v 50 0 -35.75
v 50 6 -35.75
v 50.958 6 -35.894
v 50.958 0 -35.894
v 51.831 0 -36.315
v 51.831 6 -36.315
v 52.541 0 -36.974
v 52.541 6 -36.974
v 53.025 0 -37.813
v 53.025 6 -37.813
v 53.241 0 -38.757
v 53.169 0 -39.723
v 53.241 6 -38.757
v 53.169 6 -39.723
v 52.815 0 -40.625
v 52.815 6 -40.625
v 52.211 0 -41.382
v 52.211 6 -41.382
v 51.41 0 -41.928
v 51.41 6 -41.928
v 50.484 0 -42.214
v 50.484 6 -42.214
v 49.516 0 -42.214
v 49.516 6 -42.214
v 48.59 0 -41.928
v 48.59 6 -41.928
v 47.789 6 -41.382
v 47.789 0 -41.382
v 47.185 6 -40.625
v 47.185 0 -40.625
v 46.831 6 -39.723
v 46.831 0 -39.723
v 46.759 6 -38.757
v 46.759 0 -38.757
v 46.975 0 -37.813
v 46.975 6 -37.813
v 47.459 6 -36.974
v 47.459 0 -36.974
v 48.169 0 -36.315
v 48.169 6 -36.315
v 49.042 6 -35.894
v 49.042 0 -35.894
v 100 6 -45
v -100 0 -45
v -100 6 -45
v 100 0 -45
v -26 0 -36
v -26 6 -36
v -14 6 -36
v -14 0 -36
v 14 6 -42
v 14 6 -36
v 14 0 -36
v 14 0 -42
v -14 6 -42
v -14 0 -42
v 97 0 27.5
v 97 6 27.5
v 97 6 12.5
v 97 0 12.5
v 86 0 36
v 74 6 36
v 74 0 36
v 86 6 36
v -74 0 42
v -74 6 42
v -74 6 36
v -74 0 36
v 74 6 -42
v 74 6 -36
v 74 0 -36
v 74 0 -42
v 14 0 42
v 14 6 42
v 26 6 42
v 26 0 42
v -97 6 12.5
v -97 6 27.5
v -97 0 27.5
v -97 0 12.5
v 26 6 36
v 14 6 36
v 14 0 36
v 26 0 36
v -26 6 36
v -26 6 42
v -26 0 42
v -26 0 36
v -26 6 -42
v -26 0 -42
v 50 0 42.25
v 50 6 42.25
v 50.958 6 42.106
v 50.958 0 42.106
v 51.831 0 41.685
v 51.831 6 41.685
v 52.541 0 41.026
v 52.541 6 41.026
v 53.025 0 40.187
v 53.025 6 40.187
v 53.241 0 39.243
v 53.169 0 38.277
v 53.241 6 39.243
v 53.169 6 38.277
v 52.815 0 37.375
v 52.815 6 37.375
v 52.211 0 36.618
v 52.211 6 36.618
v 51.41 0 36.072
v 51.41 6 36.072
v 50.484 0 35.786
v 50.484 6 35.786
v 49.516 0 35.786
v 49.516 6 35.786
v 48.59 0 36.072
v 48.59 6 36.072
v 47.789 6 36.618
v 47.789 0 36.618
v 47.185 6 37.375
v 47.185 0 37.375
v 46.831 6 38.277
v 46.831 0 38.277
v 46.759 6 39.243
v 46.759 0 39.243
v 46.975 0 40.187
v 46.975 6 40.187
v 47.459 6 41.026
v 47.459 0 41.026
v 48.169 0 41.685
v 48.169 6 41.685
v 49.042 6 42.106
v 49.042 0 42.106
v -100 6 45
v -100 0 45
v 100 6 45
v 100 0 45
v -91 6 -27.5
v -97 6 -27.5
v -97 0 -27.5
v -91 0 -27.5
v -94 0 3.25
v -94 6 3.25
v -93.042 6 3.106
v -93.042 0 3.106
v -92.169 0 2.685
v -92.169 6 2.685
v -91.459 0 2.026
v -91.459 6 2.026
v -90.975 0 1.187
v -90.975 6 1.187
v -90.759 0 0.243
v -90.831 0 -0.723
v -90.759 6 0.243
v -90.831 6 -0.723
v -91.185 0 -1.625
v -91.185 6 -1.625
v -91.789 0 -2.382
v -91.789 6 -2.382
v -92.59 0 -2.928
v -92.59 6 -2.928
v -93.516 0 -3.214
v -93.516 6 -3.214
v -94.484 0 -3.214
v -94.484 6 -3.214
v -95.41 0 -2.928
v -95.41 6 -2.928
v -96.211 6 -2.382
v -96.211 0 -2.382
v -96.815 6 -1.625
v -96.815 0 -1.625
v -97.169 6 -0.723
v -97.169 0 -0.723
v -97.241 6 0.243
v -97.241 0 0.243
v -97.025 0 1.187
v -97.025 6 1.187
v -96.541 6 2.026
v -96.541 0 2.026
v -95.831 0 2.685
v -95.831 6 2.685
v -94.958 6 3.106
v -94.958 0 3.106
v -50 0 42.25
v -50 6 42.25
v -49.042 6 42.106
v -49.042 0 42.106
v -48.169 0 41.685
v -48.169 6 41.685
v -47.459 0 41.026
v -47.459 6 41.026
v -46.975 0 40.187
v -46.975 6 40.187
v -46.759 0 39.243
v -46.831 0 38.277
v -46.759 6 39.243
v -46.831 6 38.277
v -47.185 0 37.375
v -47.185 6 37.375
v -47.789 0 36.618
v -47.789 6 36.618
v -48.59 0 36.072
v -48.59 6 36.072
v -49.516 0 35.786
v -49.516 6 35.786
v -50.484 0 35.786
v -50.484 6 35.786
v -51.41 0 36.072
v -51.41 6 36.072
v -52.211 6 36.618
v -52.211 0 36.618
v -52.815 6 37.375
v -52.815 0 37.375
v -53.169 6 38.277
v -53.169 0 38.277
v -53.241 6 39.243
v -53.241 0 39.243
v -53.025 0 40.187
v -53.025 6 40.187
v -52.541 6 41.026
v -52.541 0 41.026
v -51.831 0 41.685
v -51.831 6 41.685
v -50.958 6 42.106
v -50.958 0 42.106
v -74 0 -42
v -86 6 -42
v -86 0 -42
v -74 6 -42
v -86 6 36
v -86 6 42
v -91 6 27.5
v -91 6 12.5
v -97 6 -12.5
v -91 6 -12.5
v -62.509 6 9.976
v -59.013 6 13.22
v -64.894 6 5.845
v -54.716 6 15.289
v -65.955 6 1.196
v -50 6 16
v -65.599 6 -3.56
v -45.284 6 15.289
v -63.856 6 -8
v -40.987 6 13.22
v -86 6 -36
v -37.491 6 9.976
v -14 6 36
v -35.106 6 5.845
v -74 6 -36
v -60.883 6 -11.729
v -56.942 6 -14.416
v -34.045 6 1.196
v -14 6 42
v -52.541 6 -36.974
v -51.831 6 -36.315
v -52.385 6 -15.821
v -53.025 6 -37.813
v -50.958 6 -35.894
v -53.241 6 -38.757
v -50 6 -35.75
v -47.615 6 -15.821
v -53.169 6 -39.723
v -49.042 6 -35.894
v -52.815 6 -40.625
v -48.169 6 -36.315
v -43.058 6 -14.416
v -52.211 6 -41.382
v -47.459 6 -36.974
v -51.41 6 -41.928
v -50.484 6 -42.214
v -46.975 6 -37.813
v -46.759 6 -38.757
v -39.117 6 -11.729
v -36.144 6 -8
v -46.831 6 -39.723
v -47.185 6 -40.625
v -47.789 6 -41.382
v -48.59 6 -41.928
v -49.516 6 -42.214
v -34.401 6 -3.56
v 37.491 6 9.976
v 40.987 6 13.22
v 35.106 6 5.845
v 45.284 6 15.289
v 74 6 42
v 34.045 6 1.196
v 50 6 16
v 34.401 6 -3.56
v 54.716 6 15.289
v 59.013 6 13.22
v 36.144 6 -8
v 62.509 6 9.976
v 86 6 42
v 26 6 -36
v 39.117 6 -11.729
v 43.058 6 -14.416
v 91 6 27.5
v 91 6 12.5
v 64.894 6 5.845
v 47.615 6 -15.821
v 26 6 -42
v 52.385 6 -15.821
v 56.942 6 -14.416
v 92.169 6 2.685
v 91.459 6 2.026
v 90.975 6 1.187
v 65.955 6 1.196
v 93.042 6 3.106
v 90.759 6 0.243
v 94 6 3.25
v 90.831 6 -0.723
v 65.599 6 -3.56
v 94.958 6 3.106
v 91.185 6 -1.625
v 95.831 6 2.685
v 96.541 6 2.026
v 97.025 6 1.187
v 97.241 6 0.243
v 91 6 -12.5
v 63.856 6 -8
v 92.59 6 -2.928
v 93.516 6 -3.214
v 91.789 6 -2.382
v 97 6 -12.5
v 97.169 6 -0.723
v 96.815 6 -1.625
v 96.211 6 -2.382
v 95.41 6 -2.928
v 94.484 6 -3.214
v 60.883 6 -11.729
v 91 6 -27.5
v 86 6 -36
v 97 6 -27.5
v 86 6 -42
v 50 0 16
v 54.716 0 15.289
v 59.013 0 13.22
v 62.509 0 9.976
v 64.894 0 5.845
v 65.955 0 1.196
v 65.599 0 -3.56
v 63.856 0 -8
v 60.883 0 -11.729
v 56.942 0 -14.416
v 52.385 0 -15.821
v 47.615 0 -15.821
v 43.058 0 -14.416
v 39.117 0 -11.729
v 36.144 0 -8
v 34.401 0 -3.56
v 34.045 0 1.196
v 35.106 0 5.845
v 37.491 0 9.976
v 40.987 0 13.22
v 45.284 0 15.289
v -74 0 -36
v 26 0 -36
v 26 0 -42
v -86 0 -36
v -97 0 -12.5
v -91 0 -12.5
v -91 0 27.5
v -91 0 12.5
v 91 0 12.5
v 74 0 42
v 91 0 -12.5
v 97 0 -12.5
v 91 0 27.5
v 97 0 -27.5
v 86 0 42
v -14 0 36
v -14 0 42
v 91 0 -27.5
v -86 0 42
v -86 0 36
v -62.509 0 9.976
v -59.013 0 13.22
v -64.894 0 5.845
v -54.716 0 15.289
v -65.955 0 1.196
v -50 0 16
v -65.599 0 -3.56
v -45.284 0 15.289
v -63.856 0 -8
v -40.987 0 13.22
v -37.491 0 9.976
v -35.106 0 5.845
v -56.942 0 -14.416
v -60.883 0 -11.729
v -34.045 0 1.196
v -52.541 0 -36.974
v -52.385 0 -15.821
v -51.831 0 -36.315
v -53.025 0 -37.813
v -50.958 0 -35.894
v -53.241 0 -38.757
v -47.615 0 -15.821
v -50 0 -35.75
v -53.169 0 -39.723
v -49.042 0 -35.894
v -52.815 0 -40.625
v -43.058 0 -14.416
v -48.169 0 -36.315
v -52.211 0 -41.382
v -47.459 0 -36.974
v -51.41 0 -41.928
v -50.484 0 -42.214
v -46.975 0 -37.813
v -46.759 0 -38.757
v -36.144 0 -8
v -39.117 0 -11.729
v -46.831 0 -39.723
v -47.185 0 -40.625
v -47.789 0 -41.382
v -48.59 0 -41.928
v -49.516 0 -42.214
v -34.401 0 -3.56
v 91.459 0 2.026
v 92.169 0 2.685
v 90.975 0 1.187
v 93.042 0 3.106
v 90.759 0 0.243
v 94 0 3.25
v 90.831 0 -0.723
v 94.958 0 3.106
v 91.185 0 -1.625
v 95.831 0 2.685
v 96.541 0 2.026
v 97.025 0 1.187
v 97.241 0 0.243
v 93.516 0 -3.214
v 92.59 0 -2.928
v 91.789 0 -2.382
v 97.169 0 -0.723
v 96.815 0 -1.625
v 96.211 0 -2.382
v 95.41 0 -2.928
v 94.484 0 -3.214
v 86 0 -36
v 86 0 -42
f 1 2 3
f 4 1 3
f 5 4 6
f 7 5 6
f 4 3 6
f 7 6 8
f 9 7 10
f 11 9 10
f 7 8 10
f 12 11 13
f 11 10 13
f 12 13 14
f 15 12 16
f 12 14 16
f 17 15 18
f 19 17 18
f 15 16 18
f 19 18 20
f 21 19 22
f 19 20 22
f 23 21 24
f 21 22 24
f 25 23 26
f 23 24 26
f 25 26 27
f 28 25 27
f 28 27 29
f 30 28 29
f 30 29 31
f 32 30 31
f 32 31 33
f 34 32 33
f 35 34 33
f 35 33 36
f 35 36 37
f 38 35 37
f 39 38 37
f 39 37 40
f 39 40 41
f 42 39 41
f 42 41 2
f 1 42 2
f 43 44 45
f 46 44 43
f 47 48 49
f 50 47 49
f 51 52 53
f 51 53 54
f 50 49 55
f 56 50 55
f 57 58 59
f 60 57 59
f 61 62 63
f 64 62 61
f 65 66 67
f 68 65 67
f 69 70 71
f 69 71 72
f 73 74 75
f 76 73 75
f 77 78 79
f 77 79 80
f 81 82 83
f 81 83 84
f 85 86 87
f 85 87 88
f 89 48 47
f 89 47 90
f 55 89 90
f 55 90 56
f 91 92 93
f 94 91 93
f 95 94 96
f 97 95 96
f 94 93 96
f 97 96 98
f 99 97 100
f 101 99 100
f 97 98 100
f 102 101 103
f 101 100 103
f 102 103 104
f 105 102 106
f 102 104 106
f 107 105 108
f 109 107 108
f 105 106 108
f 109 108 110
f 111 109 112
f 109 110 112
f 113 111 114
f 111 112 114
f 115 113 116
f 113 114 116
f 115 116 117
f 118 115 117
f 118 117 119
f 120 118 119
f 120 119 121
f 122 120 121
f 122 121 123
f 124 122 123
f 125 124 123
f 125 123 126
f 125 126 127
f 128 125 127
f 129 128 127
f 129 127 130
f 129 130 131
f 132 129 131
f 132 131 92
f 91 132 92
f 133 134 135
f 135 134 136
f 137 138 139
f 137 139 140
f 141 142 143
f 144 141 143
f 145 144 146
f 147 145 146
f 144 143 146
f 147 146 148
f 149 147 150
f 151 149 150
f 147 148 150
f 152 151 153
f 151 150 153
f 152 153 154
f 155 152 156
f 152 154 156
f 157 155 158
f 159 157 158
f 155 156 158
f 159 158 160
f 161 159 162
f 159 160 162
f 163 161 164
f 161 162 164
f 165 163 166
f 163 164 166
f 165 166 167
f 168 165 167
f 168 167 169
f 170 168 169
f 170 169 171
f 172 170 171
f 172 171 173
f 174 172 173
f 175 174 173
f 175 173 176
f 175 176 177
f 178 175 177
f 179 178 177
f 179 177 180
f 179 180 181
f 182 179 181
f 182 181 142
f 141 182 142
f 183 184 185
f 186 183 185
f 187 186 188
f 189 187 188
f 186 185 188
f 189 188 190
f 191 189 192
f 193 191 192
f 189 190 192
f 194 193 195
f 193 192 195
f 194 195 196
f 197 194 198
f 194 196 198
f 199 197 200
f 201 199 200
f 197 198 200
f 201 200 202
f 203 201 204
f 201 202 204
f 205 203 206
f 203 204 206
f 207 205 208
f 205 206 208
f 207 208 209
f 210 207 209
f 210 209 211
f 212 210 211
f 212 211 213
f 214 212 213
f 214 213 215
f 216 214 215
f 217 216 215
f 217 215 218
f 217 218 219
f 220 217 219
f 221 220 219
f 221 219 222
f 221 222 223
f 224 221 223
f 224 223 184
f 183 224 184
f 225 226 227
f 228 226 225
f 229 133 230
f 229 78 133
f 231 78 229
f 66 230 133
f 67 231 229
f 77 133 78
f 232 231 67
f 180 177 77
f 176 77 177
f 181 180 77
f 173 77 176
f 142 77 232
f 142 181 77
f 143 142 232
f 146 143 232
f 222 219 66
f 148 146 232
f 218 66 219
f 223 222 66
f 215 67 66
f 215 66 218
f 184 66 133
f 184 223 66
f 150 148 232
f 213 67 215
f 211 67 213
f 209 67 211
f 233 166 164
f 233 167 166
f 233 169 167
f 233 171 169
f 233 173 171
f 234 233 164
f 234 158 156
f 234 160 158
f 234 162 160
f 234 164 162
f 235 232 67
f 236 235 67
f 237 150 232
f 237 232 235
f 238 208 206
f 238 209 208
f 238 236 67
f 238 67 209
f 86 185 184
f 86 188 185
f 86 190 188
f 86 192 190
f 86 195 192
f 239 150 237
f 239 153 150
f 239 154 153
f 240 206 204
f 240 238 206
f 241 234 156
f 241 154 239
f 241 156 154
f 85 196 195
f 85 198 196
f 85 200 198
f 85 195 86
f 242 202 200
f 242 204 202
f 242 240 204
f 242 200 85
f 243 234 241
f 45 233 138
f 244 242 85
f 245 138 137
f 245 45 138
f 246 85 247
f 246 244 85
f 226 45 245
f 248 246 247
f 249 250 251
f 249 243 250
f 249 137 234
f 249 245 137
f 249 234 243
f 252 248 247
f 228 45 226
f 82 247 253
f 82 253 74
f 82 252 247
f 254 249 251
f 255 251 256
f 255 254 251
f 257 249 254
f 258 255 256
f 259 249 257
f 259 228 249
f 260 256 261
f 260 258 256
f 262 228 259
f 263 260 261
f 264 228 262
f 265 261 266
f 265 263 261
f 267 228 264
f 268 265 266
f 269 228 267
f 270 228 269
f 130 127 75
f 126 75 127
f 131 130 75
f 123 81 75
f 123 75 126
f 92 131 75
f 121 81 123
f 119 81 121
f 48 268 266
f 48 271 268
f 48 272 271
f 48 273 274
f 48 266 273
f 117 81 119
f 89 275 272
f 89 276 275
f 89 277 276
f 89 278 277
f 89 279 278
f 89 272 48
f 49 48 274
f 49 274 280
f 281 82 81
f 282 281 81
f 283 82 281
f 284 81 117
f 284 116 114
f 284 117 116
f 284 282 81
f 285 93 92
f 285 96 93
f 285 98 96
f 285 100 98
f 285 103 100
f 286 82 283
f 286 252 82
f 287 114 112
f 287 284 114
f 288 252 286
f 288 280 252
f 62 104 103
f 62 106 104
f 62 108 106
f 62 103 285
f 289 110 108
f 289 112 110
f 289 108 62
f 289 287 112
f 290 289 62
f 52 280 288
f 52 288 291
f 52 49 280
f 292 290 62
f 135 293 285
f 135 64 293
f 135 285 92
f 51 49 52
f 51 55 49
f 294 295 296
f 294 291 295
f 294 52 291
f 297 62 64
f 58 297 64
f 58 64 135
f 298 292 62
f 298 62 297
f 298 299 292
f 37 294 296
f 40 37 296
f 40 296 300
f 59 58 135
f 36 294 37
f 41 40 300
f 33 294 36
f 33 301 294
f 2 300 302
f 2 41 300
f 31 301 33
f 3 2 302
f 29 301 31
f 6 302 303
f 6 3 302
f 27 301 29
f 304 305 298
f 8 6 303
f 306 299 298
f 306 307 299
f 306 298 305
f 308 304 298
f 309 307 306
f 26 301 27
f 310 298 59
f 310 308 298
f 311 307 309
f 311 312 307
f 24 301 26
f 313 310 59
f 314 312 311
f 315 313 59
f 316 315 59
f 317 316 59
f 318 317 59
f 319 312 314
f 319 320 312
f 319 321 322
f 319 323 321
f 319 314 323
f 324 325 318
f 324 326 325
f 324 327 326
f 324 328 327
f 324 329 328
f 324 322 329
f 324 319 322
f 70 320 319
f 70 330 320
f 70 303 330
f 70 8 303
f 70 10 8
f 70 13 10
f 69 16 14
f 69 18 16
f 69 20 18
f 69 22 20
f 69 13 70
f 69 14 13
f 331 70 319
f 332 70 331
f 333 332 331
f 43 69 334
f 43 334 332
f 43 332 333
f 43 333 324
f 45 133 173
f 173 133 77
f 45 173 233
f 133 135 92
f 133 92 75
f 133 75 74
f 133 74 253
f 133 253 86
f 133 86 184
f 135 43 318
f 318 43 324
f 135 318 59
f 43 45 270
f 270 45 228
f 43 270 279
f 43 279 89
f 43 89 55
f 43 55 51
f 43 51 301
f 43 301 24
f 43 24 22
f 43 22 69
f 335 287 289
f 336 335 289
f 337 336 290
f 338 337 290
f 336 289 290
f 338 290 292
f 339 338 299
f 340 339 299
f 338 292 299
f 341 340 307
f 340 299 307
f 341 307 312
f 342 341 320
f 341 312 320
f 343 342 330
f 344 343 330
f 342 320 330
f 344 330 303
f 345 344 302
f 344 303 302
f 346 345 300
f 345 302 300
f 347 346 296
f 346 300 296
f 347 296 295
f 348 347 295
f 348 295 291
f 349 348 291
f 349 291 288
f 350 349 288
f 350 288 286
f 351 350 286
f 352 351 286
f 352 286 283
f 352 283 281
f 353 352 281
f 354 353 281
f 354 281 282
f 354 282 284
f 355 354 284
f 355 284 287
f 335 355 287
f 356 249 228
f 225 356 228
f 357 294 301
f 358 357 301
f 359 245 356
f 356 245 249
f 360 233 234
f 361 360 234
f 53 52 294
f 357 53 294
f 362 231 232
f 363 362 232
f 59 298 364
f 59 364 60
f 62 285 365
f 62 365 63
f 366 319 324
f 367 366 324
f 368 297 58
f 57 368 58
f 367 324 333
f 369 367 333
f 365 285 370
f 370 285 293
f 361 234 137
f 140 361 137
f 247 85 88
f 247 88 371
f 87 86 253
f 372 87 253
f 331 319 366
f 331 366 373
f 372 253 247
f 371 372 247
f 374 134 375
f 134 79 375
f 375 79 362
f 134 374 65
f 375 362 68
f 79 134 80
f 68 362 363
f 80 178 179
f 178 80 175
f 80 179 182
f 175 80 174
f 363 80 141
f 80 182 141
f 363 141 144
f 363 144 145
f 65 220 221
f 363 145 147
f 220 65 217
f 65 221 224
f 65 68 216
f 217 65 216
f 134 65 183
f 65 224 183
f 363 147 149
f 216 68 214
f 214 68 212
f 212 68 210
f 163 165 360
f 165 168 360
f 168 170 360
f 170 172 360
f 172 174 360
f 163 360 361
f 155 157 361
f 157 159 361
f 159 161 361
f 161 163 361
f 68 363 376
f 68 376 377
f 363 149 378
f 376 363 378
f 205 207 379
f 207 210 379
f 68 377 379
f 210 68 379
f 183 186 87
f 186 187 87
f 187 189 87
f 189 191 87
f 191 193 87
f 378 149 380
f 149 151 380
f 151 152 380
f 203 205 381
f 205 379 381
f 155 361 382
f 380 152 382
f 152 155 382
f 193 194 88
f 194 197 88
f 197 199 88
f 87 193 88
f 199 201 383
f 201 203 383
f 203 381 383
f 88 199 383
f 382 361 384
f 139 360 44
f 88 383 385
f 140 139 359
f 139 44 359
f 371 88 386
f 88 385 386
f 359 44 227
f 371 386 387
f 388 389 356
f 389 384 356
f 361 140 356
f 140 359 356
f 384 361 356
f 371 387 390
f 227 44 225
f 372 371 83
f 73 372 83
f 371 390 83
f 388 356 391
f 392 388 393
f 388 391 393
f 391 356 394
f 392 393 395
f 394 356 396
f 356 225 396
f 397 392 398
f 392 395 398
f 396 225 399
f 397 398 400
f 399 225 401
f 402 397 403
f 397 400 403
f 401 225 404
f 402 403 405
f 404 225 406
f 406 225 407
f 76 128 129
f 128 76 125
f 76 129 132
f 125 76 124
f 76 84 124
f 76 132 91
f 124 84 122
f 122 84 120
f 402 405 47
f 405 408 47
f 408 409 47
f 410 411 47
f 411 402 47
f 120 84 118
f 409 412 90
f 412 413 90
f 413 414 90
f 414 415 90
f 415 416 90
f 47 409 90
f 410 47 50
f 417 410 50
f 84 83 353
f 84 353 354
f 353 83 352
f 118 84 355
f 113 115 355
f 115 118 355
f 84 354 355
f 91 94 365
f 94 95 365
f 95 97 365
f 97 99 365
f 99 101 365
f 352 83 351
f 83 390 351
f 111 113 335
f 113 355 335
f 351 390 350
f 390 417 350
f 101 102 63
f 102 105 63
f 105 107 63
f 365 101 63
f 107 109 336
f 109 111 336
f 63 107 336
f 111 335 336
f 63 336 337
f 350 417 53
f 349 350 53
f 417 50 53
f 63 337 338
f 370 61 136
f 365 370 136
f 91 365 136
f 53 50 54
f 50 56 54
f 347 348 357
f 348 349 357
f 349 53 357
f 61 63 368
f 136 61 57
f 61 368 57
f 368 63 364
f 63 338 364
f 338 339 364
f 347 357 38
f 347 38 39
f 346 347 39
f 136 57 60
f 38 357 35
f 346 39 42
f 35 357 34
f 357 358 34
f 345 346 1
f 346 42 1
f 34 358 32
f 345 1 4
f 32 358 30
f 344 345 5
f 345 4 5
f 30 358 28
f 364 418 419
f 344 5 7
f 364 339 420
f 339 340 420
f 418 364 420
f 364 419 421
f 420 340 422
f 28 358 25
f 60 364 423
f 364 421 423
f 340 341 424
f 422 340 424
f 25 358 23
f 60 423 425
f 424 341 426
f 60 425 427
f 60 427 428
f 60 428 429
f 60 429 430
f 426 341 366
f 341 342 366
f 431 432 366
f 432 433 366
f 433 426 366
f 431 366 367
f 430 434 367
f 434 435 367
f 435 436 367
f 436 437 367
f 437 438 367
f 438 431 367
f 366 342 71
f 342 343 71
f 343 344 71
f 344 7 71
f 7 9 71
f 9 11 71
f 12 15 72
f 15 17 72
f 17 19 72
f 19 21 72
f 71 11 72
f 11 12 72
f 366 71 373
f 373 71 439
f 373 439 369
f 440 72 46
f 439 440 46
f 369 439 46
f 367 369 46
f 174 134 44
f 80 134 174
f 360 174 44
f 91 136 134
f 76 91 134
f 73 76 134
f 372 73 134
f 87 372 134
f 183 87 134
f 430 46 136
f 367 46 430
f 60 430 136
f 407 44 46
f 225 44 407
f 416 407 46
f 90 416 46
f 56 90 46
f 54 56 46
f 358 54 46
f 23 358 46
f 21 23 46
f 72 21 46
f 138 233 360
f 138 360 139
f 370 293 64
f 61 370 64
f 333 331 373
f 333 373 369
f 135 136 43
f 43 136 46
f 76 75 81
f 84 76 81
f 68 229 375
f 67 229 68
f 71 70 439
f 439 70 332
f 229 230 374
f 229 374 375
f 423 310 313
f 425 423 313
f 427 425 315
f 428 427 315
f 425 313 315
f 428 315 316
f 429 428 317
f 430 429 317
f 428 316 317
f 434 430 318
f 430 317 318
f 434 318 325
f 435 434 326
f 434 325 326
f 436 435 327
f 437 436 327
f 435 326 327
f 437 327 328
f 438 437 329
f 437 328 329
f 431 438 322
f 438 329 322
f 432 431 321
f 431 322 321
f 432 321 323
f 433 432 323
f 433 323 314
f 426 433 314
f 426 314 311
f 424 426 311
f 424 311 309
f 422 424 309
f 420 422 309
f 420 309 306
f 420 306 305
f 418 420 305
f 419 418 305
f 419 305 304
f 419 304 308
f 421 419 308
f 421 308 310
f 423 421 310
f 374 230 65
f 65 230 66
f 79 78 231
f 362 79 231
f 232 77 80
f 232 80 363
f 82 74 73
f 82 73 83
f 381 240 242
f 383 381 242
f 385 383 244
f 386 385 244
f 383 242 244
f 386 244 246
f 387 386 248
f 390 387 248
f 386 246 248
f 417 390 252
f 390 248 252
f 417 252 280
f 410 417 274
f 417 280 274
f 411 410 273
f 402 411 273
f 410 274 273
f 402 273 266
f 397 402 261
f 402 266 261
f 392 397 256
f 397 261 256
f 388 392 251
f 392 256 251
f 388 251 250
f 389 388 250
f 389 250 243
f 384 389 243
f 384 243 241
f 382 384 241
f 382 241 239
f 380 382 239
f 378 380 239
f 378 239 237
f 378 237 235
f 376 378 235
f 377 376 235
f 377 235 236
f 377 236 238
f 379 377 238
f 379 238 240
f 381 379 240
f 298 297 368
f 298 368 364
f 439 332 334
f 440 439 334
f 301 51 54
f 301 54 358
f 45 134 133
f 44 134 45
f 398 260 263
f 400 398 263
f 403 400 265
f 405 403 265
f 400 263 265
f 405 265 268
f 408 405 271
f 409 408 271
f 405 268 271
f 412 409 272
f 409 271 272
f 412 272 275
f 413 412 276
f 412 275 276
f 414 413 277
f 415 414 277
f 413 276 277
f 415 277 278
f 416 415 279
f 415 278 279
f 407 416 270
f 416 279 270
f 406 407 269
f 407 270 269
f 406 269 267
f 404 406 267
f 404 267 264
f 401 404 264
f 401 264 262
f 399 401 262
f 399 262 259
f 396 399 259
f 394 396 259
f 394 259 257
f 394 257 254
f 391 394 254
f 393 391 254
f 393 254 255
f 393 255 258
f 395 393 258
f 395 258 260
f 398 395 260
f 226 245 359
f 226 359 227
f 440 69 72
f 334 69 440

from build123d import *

# Parameters (mm, degrees)
SKETCH1_W           = 200
SKETCH1_H           = 90
BOSS_EXTRUDE1_DEPTH = 6
CUT_EXTRUDE1_REACH  = 111.823
SKETCH2_R           = 16
CUT_EXTRUDE2_REACH  = 111.823
SKETCH3_R           = 3.25
SKETCH3_W           = 12
SKETCH3_H           = 6
SKETCH3_W_2         = 6
SKETCH3_H_2         = 15


with BuildPart() as part:
    # Sketch1 → Boss-Extrude1 (new body)
    with BuildSketch(Plane(origin=(0, 0, 0), x_dir=(1, 0, 0), z_dir=(0, 1, 0))):
        Rectangle(SKETCH1_W, SKETCH1_H)
    extrude(amount=BOSS_EXTRUDE1_DEPTH)

    # Sketch2 → Cut-Extrude1 (cut, up to next)
    with BuildSketch(Plane(origin=(0, 6, 0), x_dir=(1, 0, 0), z_dir=(0, 1, 0)), mode=Mode.PRIVATE) as cut_extrude1_sk1:
        with Locations(Location((-50, 0, 0), (0, 0, 270))):
            Circle(SKETCH2_R)
    cut_extrude1_tool1 = extrude(cut_extrude1_sk1.sketch, amount=-CUT_EXTRUDE1_REACH, mode=Mode.PRIVATE) & part.part
    # Sketch2 → Cut-Extrude1 (cut, up to next)
    with BuildSketch(Plane(origin=(0, 6, 0), x_dir=(1, 0, 0), z_dir=(0, 1, 0)), mode=Mode.PRIVATE) as cut_extrude1_sk2:
        with Locations(Location((50, 0, 0), (0, 0, 270))):
            Circle(SKETCH2_R)
    cut_extrude1_tool2 = extrude(cut_extrude1_sk2.sketch, amount=-CUT_EXTRUDE1_REACH, mode=Mode.PRIVATE) & part.part
    add(cut_extrude1_tool1.solids().sort_by_distance((-50, 6, 0))[0], mode=Mode.SUBTRACT)
    add(cut_extrude1_tool2.solids().sort_by_distance((50, 6, 0))[0], mode=Mode.SUBTRACT)

    # Sketch3 → Cut-Extrude2 (cut, up to next)
    with BuildSketch(Plane(origin=(0, 6, 0), x_dir=(1, 0, 0), z_dir=(0, 1, 0)), mode=Mode.PRIVATE) as cut_extrude2_sk1:
        with Locations(Location((-50, 39, 0), (0, 0, 270))):
            Circle(SKETCH3_R)
    cut_extrude2_tool1 = extrude(cut_extrude2_sk1.sketch, amount=-CUT_EXTRUDE2_REACH, mode=Mode.PRIVATE) & part.part
    # Sketch3 → Cut-Extrude2 (cut, up to next)
    with BuildSketch(Plane(origin=(0, 6, 0), x_dir=(1, 0, 0), z_dir=(0, 1, 0)), mode=Mode.PRIVATE) as cut_extrude2_sk2:
        with Locations(Location((50, 39, 0), (0, 0, 270))):
            Circle(SKETCH3_R)
    cut_extrude2_tool2 = extrude(cut_extrude2_sk2.sketch, amount=-CUT_EXTRUDE2_REACH, mode=Mode.PRIVATE) & part.part
    # Sketch3 → Cut-Extrude2 (cut, up to next)
    with BuildSketch(Plane(origin=(0, 6, 0), x_dir=(1, 0, 0), z_dir=(0, 1, 0)), mode=Mode.PRIVATE) as cut_extrude2_sk3:
        with Locations(Location((50, -39, 0), (0, 0, 270))):
            Circle(SKETCH3_R)
    cut_extrude2_tool3 = extrude(cut_extrude2_sk3.sketch, amount=-CUT_EXTRUDE2_REACH, mode=Mode.PRIVATE) & part.part
    # Sketch3 → Cut-Extrude2 (cut, up to next)
    with BuildSketch(Plane(origin=(0, 6, 0), x_dir=(1, 0, 0), z_dir=(0, 1, 0)), mode=Mode.PRIVATE) as cut_extrude2_sk4:
        with Locations(Location((-50, -39, 0), (0, 0, 270))):
            Circle(SKETCH3_R)
    cut_extrude2_tool4 = extrude(cut_extrude2_sk4.sketch, amount=-CUT_EXTRUDE2_REACH, mode=Mode.PRIVATE) & part.part
    # Sketch3 → Cut-Extrude2 (cut, up to next)
    with BuildSketch(Plane(origin=(0, 6, 0), x_dir=(1, 0, 0), z_dir=(0, 1, 0)), mode=Mode.PRIVATE) as cut_extrude2_sk5:
        with Locations(Location((-94, 0, 0), (0, 0, 270))):
            Circle(SKETCH3_R)
    cut_extrude2_tool5 = extrude(cut_extrude2_sk5.sketch, amount=-CUT_EXTRUDE2_REACH, mode=Mode.PRIVATE) & part.part
    # Sketch3 → Cut-Extrude2 (cut, up to next)
    with BuildSketch(Plane(origin=(0, 6, 0), x_dir=(1, 0, 0), z_dir=(0, 1, 0)), mode=Mode.PRIVATE) as cut_extrude2_sk6:
        with Locations(Location((94, 0, 0), (0, 0, 270))):
            Circle(SKETCH3_R)
    cut_extrude2_tool6 = extrude(cut_extrude2_sk6.sketch, amount=-CUT_EXTRUDE2_REACH, mode=Mode.PRIVATE) & part.part
    # Sketch3 → Cut-Extrude2 (cut, up to next)
    with BuildSketch(Plane(origin=(0, 6, 0), x_dir=(1, 0, 0), z_dir=(0, 1, 0)), mode=Mode.PRIVATE) as cut_extrude2_sk7:
        with Locations((-80, 39)):
            Rectangle(SKETCH3_W, SKETCH3_H)
    cut_extrude2_tool7 = extrude(cut_extrude2_sk7.sketch, amount=-CUT_EXTRUDE2_REACH, mode=Mode.PRIVATE) & part.part
    # Sketch3 → Cut-Extrude2 (cut, up to next)
    with BuildSketch(Plane(origin=(0, 6, 0), x_dir=(1, 0, 0), z_dir=(0, 1, 0)), mode=Mode.PRIVATE) as cut_extrude2_sk8:
        with Locations((-20, 39)):
            Rectangle(SKETCH3_W, SKETCH3_H)
    cut_extrude2_tool8 = extrude(cut_extrude2_sk8.sketch, amount=-CUT_EXTRUDE2_REACH, mode=Mode.PRIVATE) & part.part
    # Sketch3 → Cut-Extrude2 (cut, up to next)
    with BuildSketch(Plane(origin=(0, 6, 0), x_dir=(1, 0, 0), z_dir=(0, 1, 0)), mode=Mode.PRIVATE) as cut_extrude2_sk9:
        with Locations((20, 39)):
            Rectangle(SKETCH3_W, SKETCH3_H)
    cut_extrude2_tool9 = extrude(cut_extrude2_sk9.sketch, amount=-CUT_EXTRUDE2_REACH, mode=Mode.PRIVATE) & part.part
    # Sketch3 → Cut-Extrude2 (cut, up to next)
    with BuildSketch(Plane(origin=(0, 6, 0), x_dir=(1, 0, 0), z_dir=(0, 1, 0)), mode=Mode.PRIVATE) as cut_extrude2_sk10:
        with Locations((80, 39)):
            Rectangle(SKETCH3_W, SKETCH3_H)
    cut_extrude2_tool10 = extrude(cut_extrude2_sk10.sketch, amount=-CUT_EXTRUDE2_REACH, mode=Mode.PRIVATE) & part.part
    # Sketch3 → Cut-Extrude2 (cut, up to next)
    with BuildSketch(Plane(origin=(0, 6, 0), x_dir=(1, 0, 0), z_dir=(0, 1, 0)), mode=Mode.PRIVATE) as cut_extrude2_sk11:
        with Locations((80, -39)):
            Rectangle(SKETCH3_W, SKETCH3_H)
    cut_extrude2_tool11 = extrude(cut_extrude2_sk11.sketch, amount=-CUT_EXTRUDE2_REACH, mode=Mode.PRIVATE) & part.part
    # Sketch3 → Cut-Extrude2 (cut, up to next)
    with BuildSketch(Plane(origin=(0, 6, 0), x_dir=(1, 0, 0), z_dir=(0, 1, 0)), mode=Mode.PRIVATE) as cut_extrude2_sk12:
        with Locations((20, -39)):
            Rectangle(SKETCH3_W, SKETCH3_H)
    cut_extrude2_tool12 = extrude(cut_extrude2_sk12.sketch, amount=-CUT_EXTRUDE2_REACH, mode=Mode.PRIVATE) & part.part
    # Sketch3 → Cut-Extrude2 (cut, up to next)
    with BuildSketch(Plane(origin=(0, 6, 0), x_dir=(1, 0, 0), z_dir=(0, 1, 0)), mode=Mode.PRIVATE) as cut_extrude2_sk13:
        with Locations((-20, -39)):
            Rectangle(SKETCH3_W, SKETCH3_H)
    cut_extrude2_tool13 = extrude(cut_extrude2_sk13.sketch, amount=-CUT_EXTRUDE2_REACH, mode=Mode.PRIVATE) & part.part
    # Sketch3 → Cut-Extrude2 (cut, up to next)
    with BuildSketch(Plane(origin=(0, 6, 0), x_dir=(1, 0, 0), z_dir=(0, 1, 0)), mode=Mode.PRIVATE) as cut_extrude2_sk14:
        with Locations((-80, -39)):
            Rectangle(SKETCH3_W, SKETCH3_H)
    cut_extrude2_tool14 = extrude(cut_extrude2_sk14.sketch, amount=-CUT_EXTRUDE2_REACH, mode=Mode.PRIVATE) & part.part
    # Sketch3 → Cut-Extrude2 (cut, up to next)
    with BuildSketch(Plane(origin=(0, 6, 0), x_dir=(1, 0, 0), z_dir=(0, 1, 0)), mode=Mode.PRIVATE) as cut_extrude2_sk15:
        with Locations((-94, 20)):
            Rectangle(SKETCH3_W_2, SKETCH3_H_2)
    cut_extrude2_tool15 = extrude(cut_extrude2_sk15.sketch, amount=-CUT_EXTRUDE2_REACH, mode=Mode.PRIVATE) & part.part
    # Sketch3 → Cut-Extrude2 (cut, up to next)
    with BuildSketch(Plane(origin=(0, 6, 0), x_dir=(1, 0, 0), z_dir=(0, 1, 0)), mode=Mode.PRIVATE) as cut_extrude2_sk16:
        with Locations((-94, -20)):
            Rectangle(SKETCH3_W_2, SKETCH3_H_2)
    cut_extrude2_tool16 = extrude(cut_extrude2_sk16.sketch, amount=-CUT_EXTRUDE2_REACH, mode=Mode.PRIVATE) & part.part
    # Sketch3 → Cut-Extrude2 (cut, up to next)
    with BuildSketch(Plane(origin=(0, 6, 0), x_dir=(1, 0, 0), z_dir=(0, 1, 0)), mode=Mode.PRIVATE) as cut_extrude2_sk17:
        with Locations((94, -20)):
            Rectangle(SKETCH3_W_2, SKETCH3_H_2)
    cut_extrude2_tool17 = extrude(cut_extrude2_sk17.sketch, amount=-CUT_EXTRUDE2_REACH, mode=Mode.PRIVATE) & part.part
    # Sketch3 → Cut-Extrude2 (cut, up to next)
    with BuildSketch(Plane(origin=(0, 6, 0), x_dir=(1, 0, 0), z_dir=(0, 1, 0)), mode=Mode.PRIVATE) as cut_extrude2_sk18:
        with Locations((94, 20)):
            Rectangle(SKETCH3_W_2, SKETCH3_H_2)
    cut_extrude2_tool18 = extrude(cut_extrude2_sk18.sketch, amount=-CUT_EXTRUDE2_REACH, mode=Mode.PRIVATE) & part.part
    add(cut_extrude2_tool1.solids().sort_by_distance((-50, 6, -39))[0], mode=Mode.SUBTRACT)
    add(cut_extrude2_tool2.solids().sort_by_distance((50, 6, -39))[0], mode=Mode.SUBTRACT)
    add(cut_extrude2_tool3.solids().sort_by_distance((50, 6, 39))[0], mode=Mode.SUBTRACT)
    add(cut_extrude2_tool4.solids().sort_by_distance((-50, 6, 39))[0], mode=Mode.SUBTRACT)
    add(cut_extrude2_tool5.solids().sort_by_distance((-94, 6, 0))[0], mode=Mode.SUBTRACT)
    add(cut_extrude2_tool6.solids().sort_by_distance((94, 6, 0))[0], mode=Mode.SUBTRACT)
    add(cut_extrude2_tool7.solids().sort_by_distance((-80, 6, -39))[0], mode=Mode.SUBTRACT)
    add(cut_extrude2_tool8.solids().sort_by_distance((-20, 6, -39))[0], mode=Mode.SUBTRACT)
    add(cut_extrude2_tool9.solids().sort_by_distance((20, 6, -39))[0], mode=Mode.SUBTRACT)
    add(cut_extrude2_tool10.solids().sort_by_distance((80, 6, -39))[0], mode=Mode.SUBTRACT)
    add(cut_extrude2_tool11.solids().sort_by_distance((80, 6, 39))[0], mode=Mode.SUBTRACT)
    add(cut_extrude2_tool12.solids().sort_by_distance((20, 6, 39))[0], mode=Mode.SUBTRACT)
    add(cut_extrude2_tool13.solids().sort_by_distance((-20, 6, 39))[0], mode=Mode.SUBTRACT)
    add(cut_extrude2_tool14.solids().sort_by_distance((-80, 6, 39))[0], mode=Mode.SUBTRACT)
    add(cut_extrude2_tool15.solids().sort_by_distance((-94, 6, -20))[0], mode=Mode.SUBTRACT)
    add(cut_extrude2_tool16.solids().sort_by_distance((-94, 6, 20))[0], mode=Mode.SUBTRACT)
    add(cut_extrude2_tool17.solids().sort_by_distance((94, 6, 20))[0], mode=Mode.SUBTRACT)
    add(cut_extrude2_tool18.solids().sort_by_distance((94, 6, -20))[0], mode=Mode.SUBTRACT)


solid = part.part
